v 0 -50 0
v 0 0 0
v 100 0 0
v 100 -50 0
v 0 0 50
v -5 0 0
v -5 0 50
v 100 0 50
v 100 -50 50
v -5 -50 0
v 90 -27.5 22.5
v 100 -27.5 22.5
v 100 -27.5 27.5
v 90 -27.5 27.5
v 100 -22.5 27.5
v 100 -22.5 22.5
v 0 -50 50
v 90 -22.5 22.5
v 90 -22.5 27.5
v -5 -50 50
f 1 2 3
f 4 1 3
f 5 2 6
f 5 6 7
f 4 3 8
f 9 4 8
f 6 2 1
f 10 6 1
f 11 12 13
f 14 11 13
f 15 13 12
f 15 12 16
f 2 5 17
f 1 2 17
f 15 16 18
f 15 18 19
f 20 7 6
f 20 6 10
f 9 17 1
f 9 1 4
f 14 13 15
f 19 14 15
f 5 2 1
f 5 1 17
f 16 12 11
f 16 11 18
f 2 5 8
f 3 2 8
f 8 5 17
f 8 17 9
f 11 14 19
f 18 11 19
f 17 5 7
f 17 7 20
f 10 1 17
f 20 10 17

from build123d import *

# Parameters (mm, degrees)
F0_W      = 100
F0_H      = 50
F1_DEPTH  = 50
F1_FACE_W = 50
F1_FACE_H = 50
F3_DEPTH  = 5
F4_W      = 5
F4_H      = 5
F5_DEPTH  = 10


with BuildPart() as f1:
    # F0 (on Front) → F1 (new body)
    with BuildSketch(Plane.XZ):
        with Locations((50, 25)):
            Rectangle(F0_W, F0_H)
    extrude(amount=F1_DEPTH)


with BuildPart() as f3:
    # F1_face (on face) → F3 (new body)
    with BuildSketch(Plane(origin=(0, -25, 25), x_dir=(0, -1, 0), z_dir=(-1, 0, 0))):
        Rectangle(F1_FACE_W, F1_FACE_H)
    extrude(amount=F3_DEPTH)


with BuildPart() as f5:
    # F4 (on face) → F5 (new body)
    with BuildSketch(Plane.YZ.offset(100)):
        with Locations((-25, 25)):
            Rectangle(F4_W, F4_H)
    extrude(amount=-F5_DEPTH)


solid = Compound([f1.part, f3.part, f5.part])
